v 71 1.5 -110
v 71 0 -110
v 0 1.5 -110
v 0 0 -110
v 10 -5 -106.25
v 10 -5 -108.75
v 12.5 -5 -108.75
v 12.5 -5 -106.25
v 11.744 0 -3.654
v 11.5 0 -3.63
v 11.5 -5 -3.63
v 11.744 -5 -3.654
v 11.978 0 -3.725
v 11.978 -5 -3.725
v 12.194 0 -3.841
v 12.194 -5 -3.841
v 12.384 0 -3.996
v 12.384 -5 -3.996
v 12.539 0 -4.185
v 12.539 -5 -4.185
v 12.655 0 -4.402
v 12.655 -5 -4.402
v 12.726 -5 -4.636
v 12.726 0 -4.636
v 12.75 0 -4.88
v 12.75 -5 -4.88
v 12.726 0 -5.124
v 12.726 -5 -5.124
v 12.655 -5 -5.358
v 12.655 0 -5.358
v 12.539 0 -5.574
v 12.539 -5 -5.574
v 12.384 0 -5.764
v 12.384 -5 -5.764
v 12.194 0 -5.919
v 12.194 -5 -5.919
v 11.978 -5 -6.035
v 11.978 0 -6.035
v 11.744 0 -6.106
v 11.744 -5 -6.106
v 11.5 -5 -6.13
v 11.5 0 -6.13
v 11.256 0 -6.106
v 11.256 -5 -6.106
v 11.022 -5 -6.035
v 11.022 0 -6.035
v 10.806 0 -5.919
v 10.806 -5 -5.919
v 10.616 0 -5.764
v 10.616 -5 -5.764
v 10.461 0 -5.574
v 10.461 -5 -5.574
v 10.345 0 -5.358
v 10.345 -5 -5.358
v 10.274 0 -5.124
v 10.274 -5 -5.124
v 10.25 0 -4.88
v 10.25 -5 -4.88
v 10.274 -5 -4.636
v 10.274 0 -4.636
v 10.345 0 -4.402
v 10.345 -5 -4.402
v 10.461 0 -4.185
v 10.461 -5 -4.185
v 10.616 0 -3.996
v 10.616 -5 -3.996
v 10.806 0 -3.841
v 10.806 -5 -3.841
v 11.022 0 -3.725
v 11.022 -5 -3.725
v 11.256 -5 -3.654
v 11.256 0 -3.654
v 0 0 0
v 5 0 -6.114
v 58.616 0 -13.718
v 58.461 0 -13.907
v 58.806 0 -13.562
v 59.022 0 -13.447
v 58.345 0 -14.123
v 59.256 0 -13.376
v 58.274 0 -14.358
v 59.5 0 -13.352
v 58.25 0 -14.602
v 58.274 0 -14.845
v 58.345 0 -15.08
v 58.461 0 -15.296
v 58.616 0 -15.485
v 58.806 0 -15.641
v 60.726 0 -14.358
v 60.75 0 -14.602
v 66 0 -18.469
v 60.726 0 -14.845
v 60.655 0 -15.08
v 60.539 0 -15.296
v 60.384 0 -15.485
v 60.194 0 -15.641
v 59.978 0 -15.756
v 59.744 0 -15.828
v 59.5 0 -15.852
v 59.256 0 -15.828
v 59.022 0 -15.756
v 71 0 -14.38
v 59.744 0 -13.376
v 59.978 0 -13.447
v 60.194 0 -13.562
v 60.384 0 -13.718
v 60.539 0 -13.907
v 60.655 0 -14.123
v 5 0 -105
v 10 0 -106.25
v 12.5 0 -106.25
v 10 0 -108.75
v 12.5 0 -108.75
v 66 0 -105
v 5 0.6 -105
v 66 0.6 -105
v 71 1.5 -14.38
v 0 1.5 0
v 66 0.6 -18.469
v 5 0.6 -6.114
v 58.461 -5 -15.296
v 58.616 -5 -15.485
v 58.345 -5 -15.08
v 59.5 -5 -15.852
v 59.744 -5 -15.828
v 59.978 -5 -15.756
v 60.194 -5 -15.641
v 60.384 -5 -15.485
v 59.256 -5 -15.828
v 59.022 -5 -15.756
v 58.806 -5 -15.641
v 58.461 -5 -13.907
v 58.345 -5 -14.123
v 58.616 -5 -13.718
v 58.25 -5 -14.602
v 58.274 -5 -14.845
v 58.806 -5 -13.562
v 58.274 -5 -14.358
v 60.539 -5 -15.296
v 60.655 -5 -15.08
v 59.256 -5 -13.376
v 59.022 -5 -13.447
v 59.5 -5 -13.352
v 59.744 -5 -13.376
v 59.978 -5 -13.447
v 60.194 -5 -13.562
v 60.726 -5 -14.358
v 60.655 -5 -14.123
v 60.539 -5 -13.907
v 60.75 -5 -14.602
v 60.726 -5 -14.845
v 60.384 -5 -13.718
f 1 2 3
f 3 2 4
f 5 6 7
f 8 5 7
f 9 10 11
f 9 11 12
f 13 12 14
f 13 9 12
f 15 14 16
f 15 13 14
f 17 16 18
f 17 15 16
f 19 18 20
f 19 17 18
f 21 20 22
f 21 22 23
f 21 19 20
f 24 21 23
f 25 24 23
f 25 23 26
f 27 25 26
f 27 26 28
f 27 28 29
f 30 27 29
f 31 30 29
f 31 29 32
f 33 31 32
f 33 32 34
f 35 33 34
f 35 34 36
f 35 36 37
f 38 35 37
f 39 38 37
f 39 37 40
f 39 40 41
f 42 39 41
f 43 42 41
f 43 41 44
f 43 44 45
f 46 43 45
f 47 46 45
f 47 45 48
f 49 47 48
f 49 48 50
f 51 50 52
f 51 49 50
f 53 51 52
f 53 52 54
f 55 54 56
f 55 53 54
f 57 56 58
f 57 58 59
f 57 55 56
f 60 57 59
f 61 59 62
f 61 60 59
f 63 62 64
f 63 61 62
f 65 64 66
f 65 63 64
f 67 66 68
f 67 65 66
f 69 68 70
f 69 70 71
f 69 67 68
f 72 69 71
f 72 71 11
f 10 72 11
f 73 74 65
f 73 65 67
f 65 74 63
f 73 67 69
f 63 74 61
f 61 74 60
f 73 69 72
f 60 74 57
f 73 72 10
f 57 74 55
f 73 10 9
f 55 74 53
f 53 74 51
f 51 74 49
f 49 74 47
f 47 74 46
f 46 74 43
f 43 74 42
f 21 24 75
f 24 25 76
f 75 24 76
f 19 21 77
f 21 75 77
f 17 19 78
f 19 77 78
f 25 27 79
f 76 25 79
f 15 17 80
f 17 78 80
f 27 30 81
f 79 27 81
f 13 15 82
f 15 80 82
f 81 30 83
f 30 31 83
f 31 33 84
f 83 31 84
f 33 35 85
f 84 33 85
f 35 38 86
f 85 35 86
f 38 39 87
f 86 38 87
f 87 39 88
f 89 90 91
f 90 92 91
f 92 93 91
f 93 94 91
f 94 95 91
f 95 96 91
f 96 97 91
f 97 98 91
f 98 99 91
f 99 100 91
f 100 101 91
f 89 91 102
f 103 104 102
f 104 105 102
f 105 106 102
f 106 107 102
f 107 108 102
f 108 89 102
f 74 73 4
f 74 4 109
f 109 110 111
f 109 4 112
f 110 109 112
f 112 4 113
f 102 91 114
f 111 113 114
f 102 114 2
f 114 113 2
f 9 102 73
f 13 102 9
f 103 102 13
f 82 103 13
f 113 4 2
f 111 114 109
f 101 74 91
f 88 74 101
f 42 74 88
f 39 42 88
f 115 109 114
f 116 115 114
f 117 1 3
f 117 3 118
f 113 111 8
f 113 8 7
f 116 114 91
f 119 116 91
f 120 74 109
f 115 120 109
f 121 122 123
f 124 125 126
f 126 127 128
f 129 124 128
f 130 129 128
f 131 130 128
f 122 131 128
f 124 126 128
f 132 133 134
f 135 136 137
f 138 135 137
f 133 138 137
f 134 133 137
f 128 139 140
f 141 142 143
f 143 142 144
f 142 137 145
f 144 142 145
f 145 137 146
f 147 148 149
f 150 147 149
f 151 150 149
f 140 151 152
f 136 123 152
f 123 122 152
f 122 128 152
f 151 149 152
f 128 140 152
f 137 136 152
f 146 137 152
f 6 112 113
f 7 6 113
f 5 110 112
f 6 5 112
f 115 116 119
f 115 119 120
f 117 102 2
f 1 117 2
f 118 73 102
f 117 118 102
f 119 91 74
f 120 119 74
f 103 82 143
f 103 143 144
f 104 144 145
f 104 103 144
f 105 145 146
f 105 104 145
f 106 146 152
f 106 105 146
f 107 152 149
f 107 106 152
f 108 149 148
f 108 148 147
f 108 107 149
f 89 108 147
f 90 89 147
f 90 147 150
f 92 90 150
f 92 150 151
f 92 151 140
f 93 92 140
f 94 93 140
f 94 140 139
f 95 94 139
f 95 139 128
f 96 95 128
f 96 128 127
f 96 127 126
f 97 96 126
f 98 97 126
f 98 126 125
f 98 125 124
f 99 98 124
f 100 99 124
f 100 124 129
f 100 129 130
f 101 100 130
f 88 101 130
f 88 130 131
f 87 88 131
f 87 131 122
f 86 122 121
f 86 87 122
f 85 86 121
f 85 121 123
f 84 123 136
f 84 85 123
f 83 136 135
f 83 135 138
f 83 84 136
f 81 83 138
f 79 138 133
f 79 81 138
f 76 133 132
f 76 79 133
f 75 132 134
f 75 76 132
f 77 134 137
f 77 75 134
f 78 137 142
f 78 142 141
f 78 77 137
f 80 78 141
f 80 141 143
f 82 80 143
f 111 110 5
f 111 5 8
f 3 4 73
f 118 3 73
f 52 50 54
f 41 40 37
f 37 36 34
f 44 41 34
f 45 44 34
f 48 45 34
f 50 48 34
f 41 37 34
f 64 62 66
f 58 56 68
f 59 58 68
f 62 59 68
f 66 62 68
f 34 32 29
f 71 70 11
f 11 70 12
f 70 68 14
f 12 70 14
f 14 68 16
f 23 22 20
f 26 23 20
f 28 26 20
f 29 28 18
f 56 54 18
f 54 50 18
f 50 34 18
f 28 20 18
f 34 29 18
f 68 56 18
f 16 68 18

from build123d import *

# Parameters (mm, degrees)
BOSS_EXTRUDE1_DEPTH = 1.5
SKETCH2_R           = 1.25
SKETCH2_W           = 2.5
SKETCH2_H           = 2.5
BOSS_EXTRUDE2_DEPTH = 6.5
CUT_EXTRUDE1_DEPTH  = 0.6


with BuildPart() as part:
    # Sketch1 → Boss-Extrude1 (new body)
    with BuildSketch(Plane(origin=(0, 0, 0), x_dir=(1, 0, 0), z_dir=(0, 1, 0))):
        Polygon((0, 0), (71, 14.38), (71, 110), (0, 110), align=None)
    extrude(amount=BOSS_EXTRUDE1_DEPTH)

    # Sketch2 → Boss-Extrude2 (add)
    with BuildSketch(Plane(origin=(0, 1.5, 0), x_dir=(1, 0, 0), z_dir=(0, 1, 0))):
        with Locations(Location((11.5, 4.879915247, 0), (0, 0, 270))):
            Circle(SKETCH2_R)
        with Locations(Location((59.5, 14.601605388, 0), (0, 0, 270))):
            Circle(SKETCH2_R)
        with Locations((11.25, 107.5)):
            Rectangle(SKETCH2_W, SKETCH2_H)
    extrude(amount=-BOSS_EXTRUDE2_DEPTH)

    # Sketch3 → Cut-Extrude1 (cut)
    with BuildSketch(Plane(origin=(0, 0, 0), x_dir=(-1, 0, 0), z_dir=(0, -1, 0))):
        Polygon((-66, 105), (-66, 18.468844579), (-5, 6.114196692), (-5, 105), align=None)
    extrude(amount=-CUT_EXTRUDE1_DEPTH, mode=Mode.SUBTRACT)


solid = part.part
